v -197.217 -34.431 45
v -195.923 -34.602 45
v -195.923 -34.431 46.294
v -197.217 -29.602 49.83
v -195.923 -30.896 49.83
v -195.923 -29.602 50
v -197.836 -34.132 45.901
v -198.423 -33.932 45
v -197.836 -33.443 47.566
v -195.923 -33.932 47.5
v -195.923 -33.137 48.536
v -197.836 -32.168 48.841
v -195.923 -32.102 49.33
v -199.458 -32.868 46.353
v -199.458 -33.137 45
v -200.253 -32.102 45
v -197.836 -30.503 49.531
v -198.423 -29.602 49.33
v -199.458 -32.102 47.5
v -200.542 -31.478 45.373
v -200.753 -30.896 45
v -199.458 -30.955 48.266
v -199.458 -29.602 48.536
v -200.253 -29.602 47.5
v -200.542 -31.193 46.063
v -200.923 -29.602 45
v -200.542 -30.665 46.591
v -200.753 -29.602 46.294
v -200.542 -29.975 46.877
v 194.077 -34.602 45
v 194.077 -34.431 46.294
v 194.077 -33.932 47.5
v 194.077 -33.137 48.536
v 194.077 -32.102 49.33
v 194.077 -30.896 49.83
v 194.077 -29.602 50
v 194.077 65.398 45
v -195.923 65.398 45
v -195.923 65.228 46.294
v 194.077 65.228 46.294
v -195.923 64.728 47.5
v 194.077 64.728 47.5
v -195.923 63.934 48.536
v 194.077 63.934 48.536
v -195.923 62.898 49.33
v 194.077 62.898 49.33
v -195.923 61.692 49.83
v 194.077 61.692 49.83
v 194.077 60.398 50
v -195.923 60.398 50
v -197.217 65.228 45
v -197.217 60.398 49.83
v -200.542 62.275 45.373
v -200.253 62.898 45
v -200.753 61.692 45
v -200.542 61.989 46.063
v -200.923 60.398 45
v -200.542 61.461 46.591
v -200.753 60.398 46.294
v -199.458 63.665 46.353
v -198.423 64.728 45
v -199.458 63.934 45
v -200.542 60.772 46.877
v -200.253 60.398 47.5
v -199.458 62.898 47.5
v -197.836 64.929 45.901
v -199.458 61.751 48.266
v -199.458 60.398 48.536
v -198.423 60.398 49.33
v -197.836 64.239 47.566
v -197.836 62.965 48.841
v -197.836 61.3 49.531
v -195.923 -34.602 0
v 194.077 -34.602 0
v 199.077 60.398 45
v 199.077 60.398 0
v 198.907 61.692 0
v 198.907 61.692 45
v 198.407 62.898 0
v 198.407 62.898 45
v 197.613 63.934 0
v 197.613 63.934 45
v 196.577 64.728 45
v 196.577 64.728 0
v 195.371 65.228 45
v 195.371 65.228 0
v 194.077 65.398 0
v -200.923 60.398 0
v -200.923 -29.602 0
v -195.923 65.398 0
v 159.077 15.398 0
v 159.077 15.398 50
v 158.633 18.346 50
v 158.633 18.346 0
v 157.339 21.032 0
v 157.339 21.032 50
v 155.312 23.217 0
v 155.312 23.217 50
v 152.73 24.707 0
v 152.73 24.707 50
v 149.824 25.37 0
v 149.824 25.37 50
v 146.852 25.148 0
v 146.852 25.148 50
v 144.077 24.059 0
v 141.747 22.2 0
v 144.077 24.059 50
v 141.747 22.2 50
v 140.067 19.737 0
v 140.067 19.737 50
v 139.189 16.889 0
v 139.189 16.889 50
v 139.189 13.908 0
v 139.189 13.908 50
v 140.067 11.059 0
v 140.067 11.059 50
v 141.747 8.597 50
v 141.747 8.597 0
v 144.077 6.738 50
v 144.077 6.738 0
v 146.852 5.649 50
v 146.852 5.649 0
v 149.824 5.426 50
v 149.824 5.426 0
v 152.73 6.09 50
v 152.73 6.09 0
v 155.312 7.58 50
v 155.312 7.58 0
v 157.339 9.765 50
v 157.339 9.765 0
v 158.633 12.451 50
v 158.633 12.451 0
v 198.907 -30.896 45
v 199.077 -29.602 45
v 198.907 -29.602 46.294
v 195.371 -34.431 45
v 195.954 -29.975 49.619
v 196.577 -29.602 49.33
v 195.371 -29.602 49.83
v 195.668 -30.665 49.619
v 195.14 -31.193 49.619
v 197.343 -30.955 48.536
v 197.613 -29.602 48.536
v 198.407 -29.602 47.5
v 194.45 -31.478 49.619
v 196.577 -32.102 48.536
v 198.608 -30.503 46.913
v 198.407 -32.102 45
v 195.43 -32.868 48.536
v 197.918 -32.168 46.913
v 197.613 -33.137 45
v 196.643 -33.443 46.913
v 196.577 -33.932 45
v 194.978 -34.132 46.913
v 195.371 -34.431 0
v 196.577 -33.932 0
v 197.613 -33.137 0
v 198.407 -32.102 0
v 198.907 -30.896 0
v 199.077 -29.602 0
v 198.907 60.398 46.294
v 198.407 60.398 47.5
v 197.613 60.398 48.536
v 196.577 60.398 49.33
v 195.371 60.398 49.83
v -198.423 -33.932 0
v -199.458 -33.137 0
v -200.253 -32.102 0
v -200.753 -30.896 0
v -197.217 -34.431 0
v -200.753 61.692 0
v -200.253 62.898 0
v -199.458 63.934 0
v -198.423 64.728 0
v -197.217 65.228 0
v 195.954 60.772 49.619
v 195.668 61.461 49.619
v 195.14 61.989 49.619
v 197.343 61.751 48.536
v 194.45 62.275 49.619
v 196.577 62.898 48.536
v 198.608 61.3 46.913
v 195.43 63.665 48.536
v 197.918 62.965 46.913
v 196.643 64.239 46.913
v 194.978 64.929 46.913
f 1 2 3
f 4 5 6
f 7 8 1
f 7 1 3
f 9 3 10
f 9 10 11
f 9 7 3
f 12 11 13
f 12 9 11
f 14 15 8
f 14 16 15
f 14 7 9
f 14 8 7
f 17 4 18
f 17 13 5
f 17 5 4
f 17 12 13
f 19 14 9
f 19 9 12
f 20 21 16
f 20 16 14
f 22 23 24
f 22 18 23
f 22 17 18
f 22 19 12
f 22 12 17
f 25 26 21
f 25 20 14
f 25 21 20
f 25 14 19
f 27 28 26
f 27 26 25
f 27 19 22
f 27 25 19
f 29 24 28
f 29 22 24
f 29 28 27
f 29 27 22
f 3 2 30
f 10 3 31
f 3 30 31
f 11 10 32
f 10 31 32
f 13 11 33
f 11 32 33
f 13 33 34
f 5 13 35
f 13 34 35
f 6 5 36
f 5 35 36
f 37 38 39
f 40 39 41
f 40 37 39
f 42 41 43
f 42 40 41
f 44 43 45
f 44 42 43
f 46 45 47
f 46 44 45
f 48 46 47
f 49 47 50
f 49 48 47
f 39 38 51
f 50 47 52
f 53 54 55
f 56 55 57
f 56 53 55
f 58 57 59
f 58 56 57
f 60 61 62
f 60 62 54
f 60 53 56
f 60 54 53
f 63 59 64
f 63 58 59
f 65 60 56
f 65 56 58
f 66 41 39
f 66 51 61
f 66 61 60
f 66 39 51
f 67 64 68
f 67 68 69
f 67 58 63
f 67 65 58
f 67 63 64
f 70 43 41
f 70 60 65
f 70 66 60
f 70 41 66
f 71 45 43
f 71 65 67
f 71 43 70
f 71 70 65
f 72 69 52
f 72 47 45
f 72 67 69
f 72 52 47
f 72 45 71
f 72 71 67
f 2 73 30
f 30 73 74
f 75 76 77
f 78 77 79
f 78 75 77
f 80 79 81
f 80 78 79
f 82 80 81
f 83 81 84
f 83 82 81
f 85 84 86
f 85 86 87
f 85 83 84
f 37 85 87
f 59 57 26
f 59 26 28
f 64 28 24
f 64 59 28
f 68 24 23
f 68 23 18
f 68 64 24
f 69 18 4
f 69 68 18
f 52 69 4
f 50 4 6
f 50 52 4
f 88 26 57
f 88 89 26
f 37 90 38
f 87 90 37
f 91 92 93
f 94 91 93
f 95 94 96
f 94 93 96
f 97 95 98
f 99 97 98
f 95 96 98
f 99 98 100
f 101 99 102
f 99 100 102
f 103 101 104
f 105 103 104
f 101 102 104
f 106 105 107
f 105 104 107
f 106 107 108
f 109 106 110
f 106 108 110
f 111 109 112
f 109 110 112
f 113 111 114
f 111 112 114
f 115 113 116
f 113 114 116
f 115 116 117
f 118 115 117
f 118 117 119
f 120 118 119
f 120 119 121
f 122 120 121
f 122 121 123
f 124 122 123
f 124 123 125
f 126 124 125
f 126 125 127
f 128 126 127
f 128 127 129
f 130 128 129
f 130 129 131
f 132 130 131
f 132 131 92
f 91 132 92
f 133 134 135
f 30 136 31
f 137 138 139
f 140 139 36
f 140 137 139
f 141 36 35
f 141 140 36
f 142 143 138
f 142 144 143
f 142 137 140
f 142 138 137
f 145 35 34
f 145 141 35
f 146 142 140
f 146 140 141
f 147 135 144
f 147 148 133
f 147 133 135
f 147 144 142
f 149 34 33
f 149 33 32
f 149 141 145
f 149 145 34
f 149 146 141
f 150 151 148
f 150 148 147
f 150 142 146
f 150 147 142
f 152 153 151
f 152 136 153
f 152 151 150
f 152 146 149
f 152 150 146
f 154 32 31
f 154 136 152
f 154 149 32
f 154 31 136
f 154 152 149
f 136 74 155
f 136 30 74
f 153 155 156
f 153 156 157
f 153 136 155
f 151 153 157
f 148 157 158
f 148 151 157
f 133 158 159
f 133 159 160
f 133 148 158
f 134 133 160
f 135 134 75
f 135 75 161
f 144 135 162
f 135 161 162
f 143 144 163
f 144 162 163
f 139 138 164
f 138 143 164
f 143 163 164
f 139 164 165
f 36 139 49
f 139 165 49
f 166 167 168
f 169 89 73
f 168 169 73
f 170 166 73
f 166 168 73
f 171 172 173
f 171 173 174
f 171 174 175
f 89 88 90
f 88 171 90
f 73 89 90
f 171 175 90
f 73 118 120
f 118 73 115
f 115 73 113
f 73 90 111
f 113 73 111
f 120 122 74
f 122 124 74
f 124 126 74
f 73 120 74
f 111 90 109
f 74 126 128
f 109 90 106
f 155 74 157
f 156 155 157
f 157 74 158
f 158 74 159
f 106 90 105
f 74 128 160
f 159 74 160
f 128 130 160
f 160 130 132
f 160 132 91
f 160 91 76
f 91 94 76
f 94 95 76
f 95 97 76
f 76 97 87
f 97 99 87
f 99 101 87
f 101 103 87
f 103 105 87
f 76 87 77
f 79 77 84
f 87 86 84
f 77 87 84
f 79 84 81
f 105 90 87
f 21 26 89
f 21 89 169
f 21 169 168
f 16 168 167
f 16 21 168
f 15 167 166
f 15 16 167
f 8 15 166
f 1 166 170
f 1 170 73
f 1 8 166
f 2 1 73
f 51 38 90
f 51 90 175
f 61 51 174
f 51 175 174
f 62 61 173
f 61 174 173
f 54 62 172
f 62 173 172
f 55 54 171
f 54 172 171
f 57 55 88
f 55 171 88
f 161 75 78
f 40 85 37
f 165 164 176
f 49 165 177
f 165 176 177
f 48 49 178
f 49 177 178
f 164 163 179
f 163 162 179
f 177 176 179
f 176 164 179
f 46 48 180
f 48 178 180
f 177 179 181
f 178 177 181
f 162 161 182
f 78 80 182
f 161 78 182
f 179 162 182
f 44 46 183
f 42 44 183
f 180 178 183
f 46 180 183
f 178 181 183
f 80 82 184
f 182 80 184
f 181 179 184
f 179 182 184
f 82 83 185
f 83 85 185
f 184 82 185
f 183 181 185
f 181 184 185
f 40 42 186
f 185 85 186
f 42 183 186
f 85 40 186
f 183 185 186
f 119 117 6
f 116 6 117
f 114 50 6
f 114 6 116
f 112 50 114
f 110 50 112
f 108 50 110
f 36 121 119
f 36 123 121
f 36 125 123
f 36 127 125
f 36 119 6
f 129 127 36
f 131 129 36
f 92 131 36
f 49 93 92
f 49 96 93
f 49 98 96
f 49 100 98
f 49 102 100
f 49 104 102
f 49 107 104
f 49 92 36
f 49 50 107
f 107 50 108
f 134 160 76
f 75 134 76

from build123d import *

# Parameters (mm, degrees)
F0_W         = 400
F0_H         = 100
F1_DEPTH     = 50
F2_R         = 5
F3_T1_DEPTH  = 57.5
F3_T3_DEPTH  = 90
F3_S7_W      = 5
F3_S7_H      = 5
F3_T8_DEPTH  = 5
F3_T12_ANGLE = 90
F4_R         = 10
F5_DEPTH     = 50.001


# Not quite as in the source:
# - a fillet or chamfer that OpenCascade refuses, or shapes differently, is made with other operations: its cross-section is extruded or revolved along the edge and cut away or added


with BuildPart() as f1:
    # F0 (on Top) → F1 (new body)
    with BuildSketch(Plane.XY):
        with Locations((-0.9229257703, 15.3983329495)):
            Rectangle(F0_W, F0_H)
    extrude(amount=F1_DEPTH)

    # F2
    f2_edges = [f1.edges().sort_by_distance(p)[0] for p in [
        (-200.922926, -34.601667, 25),
        (199.077074, -34.601667, 25),
        (199.077074, 65.398333, 25),
        (199.077074, 15.398333, 50),
        (-0.922926, -34.601667, 50),
        (-0.922926, 65.398333, 50),
    ]]
    fillet(f2_edges, radius=F2_R)

    # F3: fillet of radius 5 on 1 edges, made by hand

    # F3_s2 → F3_t1 (cut)
    with BuildSketch(Plane.XY.offset(-12.5)):
        with BuildLine():
            ThreePointArc((-195.9229257703, 65.3983329495), (-199.4584596762, 63.9338668555), (-200.9229257703, 60.3983329495))
            Line((-200.9229257703, 60.3983329495), (-200.9229257703, 65.3983329495))
            Line((-200.9229257703, 65.3983329495), (-195.9229257703, 65.3983329495))
        make_face()
    extrude(amount=F3_T1_DEPTH, mode=Mode.SUBTRACT)

    # F3_s4 → F3_t3 (cut)
    with BuildSketch(Plane.XZ.offset(-60.3983329495)):
        with BuildLine():
            ThreePointArc((-200.9229257703, 45), (-199.4584596762, 48.5355339059), (-195.9229257703, 50))
            Line((-195.9229257703, 50), (-200.9229257703, 50))
            Line((-200.9229257703, 50), (-200.9229257703, 45))
        make_face()
    extrude(amount=F3_T3_DEPTH, mode=Mode.SUBTRACT)


with BuildPart() as f3_tool6:
    # F3_s7 → F3_t8 (new body)
    with BuildSketch(Plane.YZ.offset(-195.9229257703)):
        with Locations((-32.1016670505, 47.5)):
            Rectangle(F3_S7_W, F3_S7_H)
    extrude(amount=-F3_T8_DEPTH)

    # F3_s9 → F3_t10 (revolve, cut)
    with BuildSketch(Plane(origin=(-195.9229257703, -29.6016670505, 45), x_dir=(0, 0.7071067812, -0.7071067812), z_dir=(0, 0.7071067812, 0.7071067812))):
        with BuildLine():
            ThreePointArc((0, -5), (5, 0), (0, 5))
            Line((0, 5), (0, -5))
        make_face()
    revolve(axis=Axis((-195.9229257703, -29.6016670505, 45), (-1, 0, 0)), mode=Mode.SUBTRACT)


with BuildPart() as f1_1:
    add(f1.part)

    # F3_t5: cut F3_tool6
    add(f3_tool6.part, mode=Mode.SUBTRACT)

    # F3_s11 → F3_t12 (revolve, cut)
    with BuildSketch(Plane.XY.offset(45)):
        with BuildLine():
            ThreePointArc((-200.9229257703, 60.3983329495), (-199.4584596762, 63.9338668555), (-195.9229257703, 65.3983329495))
            Line((-195.9229257703, 65.3983329495), (-200.9229257703, 65.3983329495))
            Line((-200.9229257703, 65.3983329495), (-200.9229257703, 60.3983329495))
        make_face()
    revolve(axis=Axis((-200.9229257703, 60.3983329495, 45), (1, 0, 0)), revolution_arc=F3_T12_ANGLE, mode=Mode.SUBTRACT)

    # F4 (on face) → F5 (cut, through all)
    with BuildSketch(Plane.XY.offset(50)):
        with Locations((149.0770742297, 15.3983329495)):
            Circle(F4_R)
    extrude(amount=-F5_DEPTH, mode=Mode.SUBTRACT)


solid = f1_1.part
